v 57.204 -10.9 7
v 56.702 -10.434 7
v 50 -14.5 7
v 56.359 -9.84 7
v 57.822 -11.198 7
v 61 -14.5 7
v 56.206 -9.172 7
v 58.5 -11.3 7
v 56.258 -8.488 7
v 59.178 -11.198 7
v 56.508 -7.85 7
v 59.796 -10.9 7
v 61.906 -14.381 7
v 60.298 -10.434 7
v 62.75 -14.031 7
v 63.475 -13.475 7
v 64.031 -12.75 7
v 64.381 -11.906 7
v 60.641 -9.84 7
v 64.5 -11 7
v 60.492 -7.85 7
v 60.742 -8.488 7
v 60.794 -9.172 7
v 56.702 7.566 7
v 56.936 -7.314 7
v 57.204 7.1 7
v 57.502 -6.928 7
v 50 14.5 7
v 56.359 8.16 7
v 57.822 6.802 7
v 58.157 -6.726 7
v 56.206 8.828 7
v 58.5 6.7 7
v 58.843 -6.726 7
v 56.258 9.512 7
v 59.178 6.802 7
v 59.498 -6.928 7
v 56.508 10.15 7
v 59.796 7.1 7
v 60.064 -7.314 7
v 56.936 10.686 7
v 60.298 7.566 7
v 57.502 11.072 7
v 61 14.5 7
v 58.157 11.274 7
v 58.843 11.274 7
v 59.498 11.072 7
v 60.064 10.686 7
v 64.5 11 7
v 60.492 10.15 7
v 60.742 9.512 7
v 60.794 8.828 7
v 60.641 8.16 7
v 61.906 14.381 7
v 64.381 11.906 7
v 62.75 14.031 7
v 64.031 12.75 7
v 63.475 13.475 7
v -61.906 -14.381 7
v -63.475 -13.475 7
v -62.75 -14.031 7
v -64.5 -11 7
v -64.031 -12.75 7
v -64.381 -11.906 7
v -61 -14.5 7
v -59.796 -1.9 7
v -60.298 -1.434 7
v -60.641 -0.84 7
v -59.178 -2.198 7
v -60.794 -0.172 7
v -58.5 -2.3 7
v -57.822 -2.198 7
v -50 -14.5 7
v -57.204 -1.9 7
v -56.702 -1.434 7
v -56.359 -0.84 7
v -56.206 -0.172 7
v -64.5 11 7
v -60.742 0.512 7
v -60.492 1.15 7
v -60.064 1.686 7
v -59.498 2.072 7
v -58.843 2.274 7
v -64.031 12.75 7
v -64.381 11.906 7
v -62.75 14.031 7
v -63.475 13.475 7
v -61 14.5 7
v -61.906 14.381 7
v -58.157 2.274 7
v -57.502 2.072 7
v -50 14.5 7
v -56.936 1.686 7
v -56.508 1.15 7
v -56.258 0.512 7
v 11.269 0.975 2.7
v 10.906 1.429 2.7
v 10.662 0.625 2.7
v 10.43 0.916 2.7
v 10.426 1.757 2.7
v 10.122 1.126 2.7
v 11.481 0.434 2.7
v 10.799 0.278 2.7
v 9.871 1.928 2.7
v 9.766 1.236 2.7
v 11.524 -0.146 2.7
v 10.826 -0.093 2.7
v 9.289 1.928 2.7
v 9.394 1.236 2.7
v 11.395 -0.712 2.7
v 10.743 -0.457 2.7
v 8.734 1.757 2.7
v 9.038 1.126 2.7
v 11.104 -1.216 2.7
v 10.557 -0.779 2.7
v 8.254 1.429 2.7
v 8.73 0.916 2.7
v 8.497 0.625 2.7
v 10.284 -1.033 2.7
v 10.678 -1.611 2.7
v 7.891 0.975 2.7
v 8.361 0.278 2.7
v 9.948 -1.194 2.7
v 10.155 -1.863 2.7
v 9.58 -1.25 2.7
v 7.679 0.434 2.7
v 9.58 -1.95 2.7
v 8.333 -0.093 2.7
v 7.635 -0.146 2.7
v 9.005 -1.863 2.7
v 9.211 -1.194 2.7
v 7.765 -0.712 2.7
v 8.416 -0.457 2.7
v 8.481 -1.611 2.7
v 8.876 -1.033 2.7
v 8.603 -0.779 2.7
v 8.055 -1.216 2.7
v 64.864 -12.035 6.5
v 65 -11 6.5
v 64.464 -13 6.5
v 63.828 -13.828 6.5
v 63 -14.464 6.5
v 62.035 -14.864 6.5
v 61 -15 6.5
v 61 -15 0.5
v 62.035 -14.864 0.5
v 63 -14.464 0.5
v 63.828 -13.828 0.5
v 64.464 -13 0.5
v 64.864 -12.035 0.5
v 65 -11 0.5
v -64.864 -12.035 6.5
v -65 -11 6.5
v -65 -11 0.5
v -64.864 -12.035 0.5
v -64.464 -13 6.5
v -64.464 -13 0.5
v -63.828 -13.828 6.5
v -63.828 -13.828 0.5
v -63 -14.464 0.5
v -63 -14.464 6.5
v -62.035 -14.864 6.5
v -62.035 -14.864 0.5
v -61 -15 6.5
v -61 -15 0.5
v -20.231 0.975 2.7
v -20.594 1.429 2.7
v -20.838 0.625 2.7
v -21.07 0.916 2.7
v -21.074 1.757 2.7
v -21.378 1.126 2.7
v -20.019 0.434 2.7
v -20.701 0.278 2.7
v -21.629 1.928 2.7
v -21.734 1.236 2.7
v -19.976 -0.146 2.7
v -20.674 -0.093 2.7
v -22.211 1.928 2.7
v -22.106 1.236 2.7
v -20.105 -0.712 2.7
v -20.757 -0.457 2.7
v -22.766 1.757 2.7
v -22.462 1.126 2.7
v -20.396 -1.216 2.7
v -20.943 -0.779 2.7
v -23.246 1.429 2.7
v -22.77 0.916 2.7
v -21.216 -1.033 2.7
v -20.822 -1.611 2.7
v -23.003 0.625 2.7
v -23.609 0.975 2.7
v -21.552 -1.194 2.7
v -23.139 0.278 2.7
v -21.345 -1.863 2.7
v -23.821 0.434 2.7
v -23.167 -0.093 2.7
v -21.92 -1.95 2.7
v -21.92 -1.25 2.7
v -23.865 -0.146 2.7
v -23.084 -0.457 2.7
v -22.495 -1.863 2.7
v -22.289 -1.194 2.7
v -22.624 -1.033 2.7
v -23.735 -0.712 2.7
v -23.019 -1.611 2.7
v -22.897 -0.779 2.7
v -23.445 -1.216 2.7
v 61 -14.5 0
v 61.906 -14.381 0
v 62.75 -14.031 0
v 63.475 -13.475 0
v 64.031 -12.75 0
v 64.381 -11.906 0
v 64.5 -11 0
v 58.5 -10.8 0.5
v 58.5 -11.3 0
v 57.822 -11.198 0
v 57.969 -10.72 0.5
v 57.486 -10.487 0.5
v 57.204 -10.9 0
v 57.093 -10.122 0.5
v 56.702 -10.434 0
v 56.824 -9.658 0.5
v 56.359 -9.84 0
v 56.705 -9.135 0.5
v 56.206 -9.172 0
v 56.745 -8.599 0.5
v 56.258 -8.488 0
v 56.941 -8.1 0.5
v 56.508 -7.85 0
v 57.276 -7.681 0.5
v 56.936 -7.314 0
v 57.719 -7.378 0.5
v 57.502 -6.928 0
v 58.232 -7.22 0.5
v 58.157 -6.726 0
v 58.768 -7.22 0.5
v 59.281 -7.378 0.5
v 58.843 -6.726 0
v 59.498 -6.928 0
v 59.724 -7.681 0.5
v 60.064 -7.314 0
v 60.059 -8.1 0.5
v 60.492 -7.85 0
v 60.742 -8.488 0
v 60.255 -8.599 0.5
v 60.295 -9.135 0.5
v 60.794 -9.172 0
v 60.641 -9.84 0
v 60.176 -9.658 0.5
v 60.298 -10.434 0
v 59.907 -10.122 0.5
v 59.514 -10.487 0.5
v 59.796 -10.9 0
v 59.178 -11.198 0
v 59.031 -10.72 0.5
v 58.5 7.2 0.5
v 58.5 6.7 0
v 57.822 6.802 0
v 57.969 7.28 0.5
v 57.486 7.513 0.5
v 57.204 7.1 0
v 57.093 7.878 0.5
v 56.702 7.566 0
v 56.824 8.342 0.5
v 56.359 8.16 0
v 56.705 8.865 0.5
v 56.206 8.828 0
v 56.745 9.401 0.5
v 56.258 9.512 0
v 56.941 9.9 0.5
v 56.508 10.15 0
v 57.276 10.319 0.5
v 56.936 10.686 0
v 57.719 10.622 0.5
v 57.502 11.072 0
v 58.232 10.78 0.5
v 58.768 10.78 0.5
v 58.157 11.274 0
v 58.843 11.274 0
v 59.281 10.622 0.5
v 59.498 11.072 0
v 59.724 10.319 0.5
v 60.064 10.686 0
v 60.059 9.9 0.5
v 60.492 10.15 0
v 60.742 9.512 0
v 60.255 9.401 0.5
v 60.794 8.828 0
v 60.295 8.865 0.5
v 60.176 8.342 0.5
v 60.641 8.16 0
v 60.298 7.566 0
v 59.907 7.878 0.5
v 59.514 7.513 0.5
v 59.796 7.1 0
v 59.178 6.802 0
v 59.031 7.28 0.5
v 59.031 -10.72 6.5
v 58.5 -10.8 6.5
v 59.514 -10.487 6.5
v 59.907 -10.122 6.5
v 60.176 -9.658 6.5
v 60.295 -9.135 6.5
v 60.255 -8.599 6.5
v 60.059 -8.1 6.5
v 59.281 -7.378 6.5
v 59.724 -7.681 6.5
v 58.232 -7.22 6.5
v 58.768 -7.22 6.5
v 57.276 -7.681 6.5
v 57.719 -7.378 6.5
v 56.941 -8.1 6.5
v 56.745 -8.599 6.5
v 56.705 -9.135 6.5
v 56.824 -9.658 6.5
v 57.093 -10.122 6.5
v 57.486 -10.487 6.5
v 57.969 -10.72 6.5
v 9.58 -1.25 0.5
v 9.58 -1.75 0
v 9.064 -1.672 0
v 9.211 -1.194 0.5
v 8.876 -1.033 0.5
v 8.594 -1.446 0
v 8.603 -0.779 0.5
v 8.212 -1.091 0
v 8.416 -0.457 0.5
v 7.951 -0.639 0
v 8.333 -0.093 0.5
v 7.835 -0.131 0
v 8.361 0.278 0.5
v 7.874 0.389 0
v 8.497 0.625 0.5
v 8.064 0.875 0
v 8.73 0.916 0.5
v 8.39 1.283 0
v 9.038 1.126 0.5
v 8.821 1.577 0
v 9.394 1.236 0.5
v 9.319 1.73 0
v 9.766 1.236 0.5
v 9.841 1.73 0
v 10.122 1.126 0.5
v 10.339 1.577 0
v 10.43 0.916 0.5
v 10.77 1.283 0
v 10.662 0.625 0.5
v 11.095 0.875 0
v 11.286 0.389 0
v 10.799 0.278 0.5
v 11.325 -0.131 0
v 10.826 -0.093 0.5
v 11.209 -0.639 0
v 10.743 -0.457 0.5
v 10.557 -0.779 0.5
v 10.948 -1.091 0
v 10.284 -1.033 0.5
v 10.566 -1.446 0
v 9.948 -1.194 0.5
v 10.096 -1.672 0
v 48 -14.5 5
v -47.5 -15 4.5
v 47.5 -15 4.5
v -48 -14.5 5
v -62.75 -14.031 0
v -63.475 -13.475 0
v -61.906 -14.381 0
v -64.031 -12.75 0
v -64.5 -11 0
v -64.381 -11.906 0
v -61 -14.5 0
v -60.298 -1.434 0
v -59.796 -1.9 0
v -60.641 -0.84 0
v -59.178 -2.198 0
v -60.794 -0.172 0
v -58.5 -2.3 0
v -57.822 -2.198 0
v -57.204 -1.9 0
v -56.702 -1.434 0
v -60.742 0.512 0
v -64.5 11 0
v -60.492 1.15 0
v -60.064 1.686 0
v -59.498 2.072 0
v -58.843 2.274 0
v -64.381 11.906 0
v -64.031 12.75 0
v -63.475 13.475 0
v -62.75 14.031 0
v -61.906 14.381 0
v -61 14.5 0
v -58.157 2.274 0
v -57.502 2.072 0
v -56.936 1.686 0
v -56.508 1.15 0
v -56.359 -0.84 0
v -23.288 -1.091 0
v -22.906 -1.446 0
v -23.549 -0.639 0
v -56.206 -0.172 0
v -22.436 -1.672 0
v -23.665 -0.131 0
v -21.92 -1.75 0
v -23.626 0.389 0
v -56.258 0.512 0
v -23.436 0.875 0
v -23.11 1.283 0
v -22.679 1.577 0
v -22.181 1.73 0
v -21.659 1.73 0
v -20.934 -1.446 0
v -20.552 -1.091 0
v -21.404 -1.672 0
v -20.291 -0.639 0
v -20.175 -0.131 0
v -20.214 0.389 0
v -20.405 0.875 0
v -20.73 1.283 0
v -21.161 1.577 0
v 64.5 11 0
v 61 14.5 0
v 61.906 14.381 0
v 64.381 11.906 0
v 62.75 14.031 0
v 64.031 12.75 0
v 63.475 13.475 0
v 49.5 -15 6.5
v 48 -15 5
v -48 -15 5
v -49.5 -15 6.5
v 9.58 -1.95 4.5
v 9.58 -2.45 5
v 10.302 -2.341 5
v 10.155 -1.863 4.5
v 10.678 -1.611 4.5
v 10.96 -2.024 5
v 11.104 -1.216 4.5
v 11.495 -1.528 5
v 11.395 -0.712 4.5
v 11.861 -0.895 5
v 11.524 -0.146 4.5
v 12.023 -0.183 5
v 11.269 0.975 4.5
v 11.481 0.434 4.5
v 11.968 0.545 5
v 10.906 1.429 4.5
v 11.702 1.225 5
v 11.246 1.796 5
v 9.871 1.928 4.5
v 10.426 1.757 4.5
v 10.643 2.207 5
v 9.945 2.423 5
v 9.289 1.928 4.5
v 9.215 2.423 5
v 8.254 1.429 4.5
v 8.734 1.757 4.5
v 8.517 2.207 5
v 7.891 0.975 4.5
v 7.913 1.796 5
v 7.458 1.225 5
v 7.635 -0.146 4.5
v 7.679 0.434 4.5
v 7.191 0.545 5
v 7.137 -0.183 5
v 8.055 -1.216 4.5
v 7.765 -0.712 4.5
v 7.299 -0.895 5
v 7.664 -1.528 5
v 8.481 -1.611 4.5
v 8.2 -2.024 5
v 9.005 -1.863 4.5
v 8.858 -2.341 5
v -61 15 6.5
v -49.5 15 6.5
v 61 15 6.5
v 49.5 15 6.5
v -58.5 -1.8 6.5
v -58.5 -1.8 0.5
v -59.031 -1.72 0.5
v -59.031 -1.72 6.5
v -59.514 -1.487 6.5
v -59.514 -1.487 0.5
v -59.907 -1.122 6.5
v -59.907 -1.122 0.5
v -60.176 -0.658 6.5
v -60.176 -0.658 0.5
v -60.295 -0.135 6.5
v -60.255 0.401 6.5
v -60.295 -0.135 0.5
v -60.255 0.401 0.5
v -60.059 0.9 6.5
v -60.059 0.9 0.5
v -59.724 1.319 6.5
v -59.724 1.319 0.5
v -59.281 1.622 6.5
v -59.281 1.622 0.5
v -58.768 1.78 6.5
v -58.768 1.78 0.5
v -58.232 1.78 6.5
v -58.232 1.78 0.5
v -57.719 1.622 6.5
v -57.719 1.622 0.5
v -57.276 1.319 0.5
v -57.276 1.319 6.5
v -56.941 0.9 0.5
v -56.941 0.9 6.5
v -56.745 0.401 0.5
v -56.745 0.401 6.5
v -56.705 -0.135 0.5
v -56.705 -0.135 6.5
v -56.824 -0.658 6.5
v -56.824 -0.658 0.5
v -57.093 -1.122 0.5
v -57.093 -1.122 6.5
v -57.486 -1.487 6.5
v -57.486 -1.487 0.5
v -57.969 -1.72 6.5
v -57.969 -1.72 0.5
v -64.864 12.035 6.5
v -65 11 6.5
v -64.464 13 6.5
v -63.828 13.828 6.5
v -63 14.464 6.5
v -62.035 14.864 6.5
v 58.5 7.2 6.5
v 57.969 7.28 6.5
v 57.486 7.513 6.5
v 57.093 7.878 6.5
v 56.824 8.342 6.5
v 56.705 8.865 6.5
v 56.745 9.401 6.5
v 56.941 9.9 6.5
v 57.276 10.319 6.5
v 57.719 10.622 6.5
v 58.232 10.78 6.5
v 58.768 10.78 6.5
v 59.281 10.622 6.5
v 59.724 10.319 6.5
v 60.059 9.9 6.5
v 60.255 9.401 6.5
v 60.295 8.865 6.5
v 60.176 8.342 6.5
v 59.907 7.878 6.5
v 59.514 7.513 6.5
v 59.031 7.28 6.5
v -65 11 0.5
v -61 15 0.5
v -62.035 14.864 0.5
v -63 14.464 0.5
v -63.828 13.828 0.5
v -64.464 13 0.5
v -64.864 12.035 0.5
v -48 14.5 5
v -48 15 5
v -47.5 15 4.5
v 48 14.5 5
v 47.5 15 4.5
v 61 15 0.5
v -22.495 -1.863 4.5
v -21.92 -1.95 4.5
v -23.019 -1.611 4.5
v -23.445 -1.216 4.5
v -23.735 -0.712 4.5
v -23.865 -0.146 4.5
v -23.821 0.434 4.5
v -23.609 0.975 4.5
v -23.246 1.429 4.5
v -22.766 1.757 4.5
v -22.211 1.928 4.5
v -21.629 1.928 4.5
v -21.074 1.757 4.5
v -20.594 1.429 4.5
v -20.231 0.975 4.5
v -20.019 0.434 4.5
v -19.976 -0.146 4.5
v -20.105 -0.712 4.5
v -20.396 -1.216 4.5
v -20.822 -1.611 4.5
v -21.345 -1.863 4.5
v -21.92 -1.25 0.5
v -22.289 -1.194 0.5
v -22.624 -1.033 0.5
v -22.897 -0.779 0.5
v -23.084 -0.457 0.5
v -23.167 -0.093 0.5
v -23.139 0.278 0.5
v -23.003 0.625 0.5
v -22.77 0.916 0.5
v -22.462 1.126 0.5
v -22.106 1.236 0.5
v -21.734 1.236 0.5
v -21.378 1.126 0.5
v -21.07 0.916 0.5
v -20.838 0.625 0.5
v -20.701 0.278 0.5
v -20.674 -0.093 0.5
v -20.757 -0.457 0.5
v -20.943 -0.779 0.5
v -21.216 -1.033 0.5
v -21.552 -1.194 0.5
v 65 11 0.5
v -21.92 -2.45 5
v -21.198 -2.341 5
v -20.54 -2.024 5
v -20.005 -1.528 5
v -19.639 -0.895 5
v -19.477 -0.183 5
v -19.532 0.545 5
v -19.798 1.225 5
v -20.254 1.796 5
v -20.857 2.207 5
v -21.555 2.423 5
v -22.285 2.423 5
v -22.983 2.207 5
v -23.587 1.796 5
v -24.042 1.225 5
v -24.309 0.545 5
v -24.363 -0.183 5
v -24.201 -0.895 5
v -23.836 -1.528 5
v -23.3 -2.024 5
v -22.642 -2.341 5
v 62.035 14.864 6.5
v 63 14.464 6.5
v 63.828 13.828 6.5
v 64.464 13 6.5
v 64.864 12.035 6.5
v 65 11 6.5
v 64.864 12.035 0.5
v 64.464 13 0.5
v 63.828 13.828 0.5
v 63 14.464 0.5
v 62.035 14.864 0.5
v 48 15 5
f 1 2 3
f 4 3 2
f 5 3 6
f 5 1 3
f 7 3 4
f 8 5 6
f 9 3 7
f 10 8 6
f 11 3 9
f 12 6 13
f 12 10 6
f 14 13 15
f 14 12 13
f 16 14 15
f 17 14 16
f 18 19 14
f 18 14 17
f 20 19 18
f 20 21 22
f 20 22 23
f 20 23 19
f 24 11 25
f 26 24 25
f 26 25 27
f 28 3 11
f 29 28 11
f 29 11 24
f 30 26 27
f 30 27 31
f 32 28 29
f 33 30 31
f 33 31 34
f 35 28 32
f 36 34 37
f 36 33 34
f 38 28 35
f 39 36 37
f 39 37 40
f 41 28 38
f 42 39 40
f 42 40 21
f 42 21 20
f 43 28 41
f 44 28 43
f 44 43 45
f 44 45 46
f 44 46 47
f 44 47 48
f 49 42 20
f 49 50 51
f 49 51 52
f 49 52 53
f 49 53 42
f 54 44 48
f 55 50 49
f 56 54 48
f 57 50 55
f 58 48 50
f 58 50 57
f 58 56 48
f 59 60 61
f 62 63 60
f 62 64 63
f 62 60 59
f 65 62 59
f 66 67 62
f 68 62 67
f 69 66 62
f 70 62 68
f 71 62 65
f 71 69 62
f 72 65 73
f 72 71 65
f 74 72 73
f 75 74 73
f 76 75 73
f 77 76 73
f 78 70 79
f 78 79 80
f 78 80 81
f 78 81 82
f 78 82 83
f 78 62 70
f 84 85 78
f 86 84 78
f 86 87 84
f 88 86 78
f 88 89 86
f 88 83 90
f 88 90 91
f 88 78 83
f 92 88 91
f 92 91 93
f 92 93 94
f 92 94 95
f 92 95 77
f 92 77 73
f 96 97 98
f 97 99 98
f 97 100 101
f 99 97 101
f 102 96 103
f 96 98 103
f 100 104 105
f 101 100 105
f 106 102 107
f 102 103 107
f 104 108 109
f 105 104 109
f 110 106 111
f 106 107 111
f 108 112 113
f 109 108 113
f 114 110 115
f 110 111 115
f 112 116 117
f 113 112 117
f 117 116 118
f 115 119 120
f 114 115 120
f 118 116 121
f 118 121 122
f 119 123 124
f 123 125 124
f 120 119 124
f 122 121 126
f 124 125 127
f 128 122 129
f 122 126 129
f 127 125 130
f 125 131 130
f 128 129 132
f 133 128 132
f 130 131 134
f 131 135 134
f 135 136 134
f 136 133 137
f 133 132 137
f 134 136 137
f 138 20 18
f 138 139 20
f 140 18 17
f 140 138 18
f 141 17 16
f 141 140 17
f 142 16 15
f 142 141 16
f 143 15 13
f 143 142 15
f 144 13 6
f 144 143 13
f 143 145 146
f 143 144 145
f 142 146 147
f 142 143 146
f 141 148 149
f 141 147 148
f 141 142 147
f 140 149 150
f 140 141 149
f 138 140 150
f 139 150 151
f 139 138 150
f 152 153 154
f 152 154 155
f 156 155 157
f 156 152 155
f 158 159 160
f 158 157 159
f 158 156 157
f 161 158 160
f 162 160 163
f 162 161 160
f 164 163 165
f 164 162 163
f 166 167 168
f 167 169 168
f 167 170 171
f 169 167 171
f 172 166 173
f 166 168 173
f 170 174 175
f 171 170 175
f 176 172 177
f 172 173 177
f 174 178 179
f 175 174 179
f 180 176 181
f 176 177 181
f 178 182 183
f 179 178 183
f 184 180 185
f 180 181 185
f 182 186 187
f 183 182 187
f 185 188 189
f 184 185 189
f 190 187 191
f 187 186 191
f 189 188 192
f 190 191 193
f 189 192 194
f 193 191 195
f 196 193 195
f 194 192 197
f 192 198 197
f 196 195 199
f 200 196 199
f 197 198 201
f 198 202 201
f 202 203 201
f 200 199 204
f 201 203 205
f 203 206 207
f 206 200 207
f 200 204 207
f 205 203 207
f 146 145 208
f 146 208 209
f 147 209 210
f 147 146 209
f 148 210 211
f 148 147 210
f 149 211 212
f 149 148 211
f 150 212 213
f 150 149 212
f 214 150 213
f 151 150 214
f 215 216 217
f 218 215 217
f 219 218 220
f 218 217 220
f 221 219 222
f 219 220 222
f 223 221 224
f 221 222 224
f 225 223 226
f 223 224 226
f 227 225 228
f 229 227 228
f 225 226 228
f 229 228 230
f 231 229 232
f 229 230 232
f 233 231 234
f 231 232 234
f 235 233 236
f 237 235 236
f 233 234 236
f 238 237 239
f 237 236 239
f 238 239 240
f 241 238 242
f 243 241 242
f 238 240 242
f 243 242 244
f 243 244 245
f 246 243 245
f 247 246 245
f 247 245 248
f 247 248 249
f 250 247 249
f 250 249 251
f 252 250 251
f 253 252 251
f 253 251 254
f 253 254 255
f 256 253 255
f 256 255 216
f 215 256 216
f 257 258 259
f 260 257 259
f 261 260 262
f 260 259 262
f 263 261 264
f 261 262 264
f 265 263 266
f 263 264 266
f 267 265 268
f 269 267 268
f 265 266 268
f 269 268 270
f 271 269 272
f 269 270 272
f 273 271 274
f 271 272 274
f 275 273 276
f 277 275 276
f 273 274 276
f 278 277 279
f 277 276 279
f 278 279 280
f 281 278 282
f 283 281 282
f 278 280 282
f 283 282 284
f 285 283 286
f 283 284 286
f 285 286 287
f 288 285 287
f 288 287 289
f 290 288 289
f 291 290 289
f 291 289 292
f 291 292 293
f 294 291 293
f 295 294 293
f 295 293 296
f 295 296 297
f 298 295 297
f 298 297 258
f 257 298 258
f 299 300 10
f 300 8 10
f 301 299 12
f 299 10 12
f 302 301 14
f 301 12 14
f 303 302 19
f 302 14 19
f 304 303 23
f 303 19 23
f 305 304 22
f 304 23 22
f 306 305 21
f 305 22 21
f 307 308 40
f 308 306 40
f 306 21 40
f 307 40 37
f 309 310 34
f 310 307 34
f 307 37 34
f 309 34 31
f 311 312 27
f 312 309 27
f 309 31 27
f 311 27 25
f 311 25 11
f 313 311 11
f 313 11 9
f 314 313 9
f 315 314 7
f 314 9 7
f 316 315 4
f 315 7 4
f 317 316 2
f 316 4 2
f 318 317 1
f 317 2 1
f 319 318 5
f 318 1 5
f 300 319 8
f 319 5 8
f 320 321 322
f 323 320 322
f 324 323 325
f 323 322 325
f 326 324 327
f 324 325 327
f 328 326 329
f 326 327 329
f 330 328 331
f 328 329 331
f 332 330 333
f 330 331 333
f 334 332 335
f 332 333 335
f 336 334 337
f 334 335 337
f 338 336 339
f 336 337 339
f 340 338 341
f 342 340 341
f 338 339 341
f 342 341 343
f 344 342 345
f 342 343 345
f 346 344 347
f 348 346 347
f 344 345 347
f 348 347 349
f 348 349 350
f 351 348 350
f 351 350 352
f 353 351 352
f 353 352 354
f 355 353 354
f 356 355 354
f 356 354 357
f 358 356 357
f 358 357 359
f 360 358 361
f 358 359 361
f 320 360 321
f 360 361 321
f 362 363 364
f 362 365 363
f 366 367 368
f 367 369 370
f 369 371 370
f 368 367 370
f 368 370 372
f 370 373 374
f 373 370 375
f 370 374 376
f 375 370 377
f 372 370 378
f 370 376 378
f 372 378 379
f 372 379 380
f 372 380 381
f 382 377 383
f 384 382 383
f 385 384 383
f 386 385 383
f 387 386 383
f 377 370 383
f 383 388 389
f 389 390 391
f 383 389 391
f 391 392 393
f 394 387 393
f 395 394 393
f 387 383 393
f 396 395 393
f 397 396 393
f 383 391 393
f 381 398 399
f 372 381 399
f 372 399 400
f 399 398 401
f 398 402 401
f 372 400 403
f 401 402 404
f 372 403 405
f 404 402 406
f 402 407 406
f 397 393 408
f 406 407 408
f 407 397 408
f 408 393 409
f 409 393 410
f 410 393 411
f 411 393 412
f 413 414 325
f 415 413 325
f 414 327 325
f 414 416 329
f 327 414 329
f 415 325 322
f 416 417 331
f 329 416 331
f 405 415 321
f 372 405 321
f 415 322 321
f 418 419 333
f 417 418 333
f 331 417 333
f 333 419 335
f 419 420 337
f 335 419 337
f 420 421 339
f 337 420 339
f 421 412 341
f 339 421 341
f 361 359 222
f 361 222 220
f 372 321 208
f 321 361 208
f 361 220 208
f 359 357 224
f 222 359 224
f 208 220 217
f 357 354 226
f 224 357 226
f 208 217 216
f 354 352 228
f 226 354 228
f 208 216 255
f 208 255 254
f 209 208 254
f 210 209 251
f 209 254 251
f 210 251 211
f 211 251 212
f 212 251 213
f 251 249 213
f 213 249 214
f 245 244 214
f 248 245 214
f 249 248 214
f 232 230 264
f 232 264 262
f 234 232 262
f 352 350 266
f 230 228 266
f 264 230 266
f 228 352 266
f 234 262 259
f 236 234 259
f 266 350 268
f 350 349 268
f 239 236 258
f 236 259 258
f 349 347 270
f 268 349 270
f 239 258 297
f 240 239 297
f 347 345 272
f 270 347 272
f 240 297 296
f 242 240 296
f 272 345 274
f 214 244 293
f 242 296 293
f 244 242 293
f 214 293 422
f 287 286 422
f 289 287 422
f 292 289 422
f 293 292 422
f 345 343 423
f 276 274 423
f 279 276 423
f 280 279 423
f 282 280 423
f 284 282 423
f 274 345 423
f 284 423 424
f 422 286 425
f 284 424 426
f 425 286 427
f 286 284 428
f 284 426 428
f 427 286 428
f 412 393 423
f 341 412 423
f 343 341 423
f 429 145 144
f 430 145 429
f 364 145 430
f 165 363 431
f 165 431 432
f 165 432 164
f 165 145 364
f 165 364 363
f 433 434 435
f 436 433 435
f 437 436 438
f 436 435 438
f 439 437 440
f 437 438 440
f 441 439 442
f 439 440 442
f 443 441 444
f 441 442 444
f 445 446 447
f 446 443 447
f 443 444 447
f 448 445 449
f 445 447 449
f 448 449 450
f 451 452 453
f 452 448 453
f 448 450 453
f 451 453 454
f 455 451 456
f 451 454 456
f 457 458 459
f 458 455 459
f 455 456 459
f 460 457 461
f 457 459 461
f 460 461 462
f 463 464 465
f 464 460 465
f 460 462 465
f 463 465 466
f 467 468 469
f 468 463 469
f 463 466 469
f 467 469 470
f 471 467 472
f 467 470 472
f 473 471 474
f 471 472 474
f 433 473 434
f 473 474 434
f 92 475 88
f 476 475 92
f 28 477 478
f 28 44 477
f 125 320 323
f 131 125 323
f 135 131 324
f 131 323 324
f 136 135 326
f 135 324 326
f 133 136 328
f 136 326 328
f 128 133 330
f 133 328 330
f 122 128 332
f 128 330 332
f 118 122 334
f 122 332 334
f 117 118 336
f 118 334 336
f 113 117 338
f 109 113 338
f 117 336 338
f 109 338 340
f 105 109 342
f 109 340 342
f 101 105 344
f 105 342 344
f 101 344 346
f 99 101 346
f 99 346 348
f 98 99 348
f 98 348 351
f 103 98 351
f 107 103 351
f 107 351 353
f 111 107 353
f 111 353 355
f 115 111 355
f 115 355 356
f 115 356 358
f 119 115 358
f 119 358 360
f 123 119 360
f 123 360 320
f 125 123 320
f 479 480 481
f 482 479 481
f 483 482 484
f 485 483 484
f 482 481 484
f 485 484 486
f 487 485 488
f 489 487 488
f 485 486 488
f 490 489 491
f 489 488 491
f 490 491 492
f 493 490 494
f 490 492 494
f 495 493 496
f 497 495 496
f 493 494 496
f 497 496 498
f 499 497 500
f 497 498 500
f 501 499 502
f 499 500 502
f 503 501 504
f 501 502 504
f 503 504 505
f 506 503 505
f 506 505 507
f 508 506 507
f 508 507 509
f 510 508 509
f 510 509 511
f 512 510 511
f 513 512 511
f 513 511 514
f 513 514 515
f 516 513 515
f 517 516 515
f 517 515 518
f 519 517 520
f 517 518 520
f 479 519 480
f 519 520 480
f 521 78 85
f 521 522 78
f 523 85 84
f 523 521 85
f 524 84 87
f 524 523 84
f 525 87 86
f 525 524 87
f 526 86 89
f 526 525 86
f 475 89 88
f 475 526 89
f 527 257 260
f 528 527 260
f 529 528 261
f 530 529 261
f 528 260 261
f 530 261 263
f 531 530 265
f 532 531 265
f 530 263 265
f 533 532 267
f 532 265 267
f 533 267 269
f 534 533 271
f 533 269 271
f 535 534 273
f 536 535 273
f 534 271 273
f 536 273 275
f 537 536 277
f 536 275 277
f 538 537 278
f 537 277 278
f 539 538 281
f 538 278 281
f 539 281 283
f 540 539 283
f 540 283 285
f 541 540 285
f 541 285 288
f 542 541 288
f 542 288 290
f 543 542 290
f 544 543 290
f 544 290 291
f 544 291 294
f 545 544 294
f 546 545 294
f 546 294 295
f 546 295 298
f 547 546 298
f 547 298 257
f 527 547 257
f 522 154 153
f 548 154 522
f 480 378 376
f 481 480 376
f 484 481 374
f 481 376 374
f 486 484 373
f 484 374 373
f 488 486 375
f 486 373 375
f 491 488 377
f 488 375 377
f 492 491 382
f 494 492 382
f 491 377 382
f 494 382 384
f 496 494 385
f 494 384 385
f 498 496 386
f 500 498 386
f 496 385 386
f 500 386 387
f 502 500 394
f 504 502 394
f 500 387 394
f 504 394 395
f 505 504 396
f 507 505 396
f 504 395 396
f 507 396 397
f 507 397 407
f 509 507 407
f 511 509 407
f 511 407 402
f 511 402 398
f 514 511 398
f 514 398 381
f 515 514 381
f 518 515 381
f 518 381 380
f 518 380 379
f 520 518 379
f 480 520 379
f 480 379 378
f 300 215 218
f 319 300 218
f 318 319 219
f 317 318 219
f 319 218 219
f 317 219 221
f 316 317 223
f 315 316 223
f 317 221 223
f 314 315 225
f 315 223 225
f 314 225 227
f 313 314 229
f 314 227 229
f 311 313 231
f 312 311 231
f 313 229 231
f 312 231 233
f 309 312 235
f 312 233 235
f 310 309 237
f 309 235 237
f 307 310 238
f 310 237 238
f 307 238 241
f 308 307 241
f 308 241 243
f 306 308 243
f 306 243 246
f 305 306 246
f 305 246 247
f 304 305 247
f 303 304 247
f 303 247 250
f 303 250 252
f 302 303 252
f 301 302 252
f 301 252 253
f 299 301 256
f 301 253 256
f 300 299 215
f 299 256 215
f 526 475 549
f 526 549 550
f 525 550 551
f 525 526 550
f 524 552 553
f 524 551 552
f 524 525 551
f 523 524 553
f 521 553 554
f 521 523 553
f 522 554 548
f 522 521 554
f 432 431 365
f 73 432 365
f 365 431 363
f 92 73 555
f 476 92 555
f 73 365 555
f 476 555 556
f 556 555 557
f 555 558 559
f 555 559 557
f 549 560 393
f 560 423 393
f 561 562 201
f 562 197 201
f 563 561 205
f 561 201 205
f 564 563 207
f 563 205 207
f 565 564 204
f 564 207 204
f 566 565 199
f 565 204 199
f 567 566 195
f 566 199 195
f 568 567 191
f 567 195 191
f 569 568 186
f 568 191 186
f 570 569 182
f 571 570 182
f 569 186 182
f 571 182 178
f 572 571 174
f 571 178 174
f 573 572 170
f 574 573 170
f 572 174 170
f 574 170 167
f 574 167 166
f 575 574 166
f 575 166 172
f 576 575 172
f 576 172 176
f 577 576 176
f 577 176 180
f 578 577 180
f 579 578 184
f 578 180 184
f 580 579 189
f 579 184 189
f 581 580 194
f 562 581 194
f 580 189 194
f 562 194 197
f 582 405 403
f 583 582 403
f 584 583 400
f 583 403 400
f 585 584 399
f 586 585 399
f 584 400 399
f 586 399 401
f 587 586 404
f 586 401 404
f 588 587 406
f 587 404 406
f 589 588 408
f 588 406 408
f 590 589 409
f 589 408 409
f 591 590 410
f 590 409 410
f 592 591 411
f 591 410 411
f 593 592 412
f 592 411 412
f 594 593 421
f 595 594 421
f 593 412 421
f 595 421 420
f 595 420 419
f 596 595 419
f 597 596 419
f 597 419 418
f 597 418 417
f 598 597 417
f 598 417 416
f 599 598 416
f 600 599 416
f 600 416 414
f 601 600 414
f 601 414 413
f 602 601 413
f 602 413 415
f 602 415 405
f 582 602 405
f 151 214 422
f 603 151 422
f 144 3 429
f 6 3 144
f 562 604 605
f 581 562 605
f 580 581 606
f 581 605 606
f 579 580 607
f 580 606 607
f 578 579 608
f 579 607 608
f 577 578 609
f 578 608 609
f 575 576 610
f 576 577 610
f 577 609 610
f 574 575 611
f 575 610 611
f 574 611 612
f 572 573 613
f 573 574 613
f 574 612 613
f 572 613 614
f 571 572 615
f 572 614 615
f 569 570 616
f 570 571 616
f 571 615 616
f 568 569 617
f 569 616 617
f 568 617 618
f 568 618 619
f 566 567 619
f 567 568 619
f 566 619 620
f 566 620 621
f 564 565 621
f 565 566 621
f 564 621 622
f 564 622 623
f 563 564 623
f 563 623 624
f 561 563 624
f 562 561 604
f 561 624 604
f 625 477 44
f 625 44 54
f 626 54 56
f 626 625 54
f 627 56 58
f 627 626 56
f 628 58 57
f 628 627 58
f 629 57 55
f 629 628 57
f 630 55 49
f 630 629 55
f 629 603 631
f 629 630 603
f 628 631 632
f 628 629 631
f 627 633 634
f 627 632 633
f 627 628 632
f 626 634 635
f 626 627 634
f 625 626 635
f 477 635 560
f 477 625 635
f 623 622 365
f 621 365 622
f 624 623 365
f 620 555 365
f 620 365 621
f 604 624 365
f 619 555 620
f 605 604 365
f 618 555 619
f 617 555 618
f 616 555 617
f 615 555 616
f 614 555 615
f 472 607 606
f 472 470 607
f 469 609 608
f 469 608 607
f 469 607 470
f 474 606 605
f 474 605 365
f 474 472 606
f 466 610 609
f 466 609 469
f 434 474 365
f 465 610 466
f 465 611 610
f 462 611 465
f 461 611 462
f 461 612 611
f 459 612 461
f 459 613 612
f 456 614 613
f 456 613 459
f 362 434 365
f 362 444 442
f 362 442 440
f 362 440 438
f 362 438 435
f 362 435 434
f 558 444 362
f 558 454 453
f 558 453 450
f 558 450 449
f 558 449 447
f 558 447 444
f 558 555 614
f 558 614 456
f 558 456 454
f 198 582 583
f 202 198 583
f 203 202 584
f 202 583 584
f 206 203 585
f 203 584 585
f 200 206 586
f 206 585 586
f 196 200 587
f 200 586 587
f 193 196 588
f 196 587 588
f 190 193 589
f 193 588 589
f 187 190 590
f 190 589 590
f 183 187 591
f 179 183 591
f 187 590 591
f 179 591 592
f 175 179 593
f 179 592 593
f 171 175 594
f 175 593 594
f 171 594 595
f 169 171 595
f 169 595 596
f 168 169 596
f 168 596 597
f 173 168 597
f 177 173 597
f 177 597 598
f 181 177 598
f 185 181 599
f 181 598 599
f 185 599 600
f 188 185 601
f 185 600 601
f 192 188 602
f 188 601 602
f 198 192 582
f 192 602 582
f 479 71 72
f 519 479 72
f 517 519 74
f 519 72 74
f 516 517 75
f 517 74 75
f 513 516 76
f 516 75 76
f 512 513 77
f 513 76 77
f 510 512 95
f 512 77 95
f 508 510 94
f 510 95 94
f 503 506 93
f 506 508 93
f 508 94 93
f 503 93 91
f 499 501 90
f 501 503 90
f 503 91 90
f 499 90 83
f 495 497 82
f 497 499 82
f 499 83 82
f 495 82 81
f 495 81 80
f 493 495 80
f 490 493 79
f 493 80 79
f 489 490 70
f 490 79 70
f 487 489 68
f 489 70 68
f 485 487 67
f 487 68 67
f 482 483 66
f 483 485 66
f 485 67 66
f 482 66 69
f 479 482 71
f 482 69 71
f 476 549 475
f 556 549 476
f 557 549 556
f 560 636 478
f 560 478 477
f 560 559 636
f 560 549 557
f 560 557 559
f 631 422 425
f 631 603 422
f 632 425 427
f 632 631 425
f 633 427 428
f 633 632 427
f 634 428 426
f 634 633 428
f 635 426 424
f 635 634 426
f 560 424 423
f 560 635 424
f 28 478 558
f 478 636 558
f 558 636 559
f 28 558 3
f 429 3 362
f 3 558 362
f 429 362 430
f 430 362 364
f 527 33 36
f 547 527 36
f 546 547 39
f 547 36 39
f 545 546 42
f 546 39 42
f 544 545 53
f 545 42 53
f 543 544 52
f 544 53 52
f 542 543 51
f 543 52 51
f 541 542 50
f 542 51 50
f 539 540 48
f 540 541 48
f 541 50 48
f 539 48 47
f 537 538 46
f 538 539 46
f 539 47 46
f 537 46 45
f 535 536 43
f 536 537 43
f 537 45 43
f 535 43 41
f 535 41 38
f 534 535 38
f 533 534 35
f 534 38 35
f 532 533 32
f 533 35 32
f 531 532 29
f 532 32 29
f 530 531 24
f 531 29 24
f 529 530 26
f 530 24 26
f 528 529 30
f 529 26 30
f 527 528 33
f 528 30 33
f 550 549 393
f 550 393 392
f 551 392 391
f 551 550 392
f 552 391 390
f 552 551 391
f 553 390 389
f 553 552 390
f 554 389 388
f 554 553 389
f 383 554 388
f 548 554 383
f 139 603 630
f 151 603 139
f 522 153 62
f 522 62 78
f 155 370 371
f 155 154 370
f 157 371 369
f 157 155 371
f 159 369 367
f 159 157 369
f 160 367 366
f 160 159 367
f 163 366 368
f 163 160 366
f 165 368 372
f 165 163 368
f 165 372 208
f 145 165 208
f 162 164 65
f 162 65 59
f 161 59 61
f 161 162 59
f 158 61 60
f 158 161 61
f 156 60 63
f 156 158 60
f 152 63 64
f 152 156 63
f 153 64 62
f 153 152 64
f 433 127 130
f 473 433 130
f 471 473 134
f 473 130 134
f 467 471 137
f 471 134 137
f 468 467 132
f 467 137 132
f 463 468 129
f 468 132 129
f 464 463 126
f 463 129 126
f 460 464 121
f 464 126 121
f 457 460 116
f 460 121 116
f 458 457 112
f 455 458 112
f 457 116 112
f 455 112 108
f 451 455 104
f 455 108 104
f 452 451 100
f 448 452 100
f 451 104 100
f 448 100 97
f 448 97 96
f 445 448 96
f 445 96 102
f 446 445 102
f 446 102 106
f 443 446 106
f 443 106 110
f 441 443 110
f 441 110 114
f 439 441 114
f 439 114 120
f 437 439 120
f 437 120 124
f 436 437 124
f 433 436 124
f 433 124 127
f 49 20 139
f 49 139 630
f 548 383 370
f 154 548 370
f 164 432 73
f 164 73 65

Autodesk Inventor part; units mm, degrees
ref_plane "YZ Plane" through (0, 0, 0) normal (1, 0, 0) x (0, 1, 0)
ref_plane "XZ Plane" through (0, 0, 0) normal (0, 1, 0) x (-1, 0, 0)
ref_plane "XY Plane" through (0, 0, 0) normal (0, 0, 1) x (1, 0, 0)
sketch "Sketch1" plane through (0, 0, 0) normal (0, 0, 1) x (1, 0, 0)
  line L0 (-65, 15) -> (65, 15)
  line L1 (65, 15) -> (65, -15)
  line L2 (65, -15) -> (-65, -15)
  line L3 (-65, -15) -> (-65, 15)
  point P0 (0, 0)
  point P1 (0, 15)
  point P2 (65, 0)
  dimension "d0" = 130
  dimension "d1" = 30
extrude "Extrusion1" add sketch "Sketch1" along normal blind 7
sketch "Sketch2" plane through (0, 0, 7) normal (0, 0, 1) x (1, 0, 0)
  line L0 (58.5, 9) -> (58.5, -9) construction
  line L1 (-58.5, 0) -> (58.5, 0) construction
  point P0 (0, 0)
  point P1 (0, 0)
  dimension "d4" = 117
  dimension "d5" = 18
hole "Hole1" at (-58.5, 0, 7) at (58.5, 9, 7) at (58.5, -9, 7) direction (0, 0, -1) diameter 3.6 end through all
sketch "Sketch3" plane through (0, 0, 7) normal (0, 0, 1) x (1, 0, 0)
  line L0 (65, 15) -> (-65, 15) projected
  line L1 (-65, -15) -> (65, -15) projected
  line L2 (-50, 15) -> (50, 15)
  line L3 (50, 15) -> (50, -15)
  line L4 (50, -15) -> (-50, -15)
  line L5 (-50, -15) -> (-50, 15)
  point P0 (0, 0)
  point P1 (0, -15)
  dimension "d13" = 100
extrude "Extrusion2" cut sketch "Sketch3" against normal blind 2
sketch "Sketch4" plane through (0, 0, 5) normal (0, 0, 1) x (1, 0, 0)
  line L0 (-21.9201, 0) -> (9.5799, 0) construction
  point P0 (0, 0)
  dimension "d16" = 31.5
hole "Hole2" at (-21.9201, 0, 5) at (9.5799, 0, 5) direction (0, 0, -1) diameter 2.5 end through all counterbore diameter 3.9 counterbore depth 2.3
fillet "Fillet1" radius 4 4 edges at (-65, -15, 3.5) (-65, 15, 3.5) (65, 15, 3.5) (65, -15, 3.5)
chamfer "Chamfer1" distance 2 angle 45 2 edges at (-50, 0, 5) (50, 0, 5)
chamfer "Chamfer2" distance 0.5 angle 45 10 edges at (-21.9201, 1.95, 5) (9.5799, 1.95, 5) (58.5, -7.2, 7) (58.5, 10.8, 7) (-58.5, 1.8, 7) (58.5, -7.2, 0) (-58.5, 1.8, 0) (58.5, 10.8, 0) (-21.9201, 1.25, 0) (9.5799, 1.25, 0)
chamfer "Chamfer3" distance 0.5 angle 45 20 edges at (0, 15, 5) (-55.5, 15, 7) (-63.8284, 13.8284, 7) (-65, 0, 7) (-63.8284, -13.8284, 7) (-55.5, -15, 7) (0, -15, 5) (55.5, 15, 7) (63.8284, 13.8284, 7) (65, 0, 7) (63.8284, -13.8284, 7) (55.5, -15, 7) (0, 15, 0) (-63.8284, 13.8284, 0) (-65, 0, 0) (-63.8284, -13.8284, 0) (0, -15, 0) (63.8284, -13.8284, 0) (65, 0, 0) (63.8284, 13.8284, 0)
properties part number "LRS-150-din-bracket" material "ABS Plastic"
